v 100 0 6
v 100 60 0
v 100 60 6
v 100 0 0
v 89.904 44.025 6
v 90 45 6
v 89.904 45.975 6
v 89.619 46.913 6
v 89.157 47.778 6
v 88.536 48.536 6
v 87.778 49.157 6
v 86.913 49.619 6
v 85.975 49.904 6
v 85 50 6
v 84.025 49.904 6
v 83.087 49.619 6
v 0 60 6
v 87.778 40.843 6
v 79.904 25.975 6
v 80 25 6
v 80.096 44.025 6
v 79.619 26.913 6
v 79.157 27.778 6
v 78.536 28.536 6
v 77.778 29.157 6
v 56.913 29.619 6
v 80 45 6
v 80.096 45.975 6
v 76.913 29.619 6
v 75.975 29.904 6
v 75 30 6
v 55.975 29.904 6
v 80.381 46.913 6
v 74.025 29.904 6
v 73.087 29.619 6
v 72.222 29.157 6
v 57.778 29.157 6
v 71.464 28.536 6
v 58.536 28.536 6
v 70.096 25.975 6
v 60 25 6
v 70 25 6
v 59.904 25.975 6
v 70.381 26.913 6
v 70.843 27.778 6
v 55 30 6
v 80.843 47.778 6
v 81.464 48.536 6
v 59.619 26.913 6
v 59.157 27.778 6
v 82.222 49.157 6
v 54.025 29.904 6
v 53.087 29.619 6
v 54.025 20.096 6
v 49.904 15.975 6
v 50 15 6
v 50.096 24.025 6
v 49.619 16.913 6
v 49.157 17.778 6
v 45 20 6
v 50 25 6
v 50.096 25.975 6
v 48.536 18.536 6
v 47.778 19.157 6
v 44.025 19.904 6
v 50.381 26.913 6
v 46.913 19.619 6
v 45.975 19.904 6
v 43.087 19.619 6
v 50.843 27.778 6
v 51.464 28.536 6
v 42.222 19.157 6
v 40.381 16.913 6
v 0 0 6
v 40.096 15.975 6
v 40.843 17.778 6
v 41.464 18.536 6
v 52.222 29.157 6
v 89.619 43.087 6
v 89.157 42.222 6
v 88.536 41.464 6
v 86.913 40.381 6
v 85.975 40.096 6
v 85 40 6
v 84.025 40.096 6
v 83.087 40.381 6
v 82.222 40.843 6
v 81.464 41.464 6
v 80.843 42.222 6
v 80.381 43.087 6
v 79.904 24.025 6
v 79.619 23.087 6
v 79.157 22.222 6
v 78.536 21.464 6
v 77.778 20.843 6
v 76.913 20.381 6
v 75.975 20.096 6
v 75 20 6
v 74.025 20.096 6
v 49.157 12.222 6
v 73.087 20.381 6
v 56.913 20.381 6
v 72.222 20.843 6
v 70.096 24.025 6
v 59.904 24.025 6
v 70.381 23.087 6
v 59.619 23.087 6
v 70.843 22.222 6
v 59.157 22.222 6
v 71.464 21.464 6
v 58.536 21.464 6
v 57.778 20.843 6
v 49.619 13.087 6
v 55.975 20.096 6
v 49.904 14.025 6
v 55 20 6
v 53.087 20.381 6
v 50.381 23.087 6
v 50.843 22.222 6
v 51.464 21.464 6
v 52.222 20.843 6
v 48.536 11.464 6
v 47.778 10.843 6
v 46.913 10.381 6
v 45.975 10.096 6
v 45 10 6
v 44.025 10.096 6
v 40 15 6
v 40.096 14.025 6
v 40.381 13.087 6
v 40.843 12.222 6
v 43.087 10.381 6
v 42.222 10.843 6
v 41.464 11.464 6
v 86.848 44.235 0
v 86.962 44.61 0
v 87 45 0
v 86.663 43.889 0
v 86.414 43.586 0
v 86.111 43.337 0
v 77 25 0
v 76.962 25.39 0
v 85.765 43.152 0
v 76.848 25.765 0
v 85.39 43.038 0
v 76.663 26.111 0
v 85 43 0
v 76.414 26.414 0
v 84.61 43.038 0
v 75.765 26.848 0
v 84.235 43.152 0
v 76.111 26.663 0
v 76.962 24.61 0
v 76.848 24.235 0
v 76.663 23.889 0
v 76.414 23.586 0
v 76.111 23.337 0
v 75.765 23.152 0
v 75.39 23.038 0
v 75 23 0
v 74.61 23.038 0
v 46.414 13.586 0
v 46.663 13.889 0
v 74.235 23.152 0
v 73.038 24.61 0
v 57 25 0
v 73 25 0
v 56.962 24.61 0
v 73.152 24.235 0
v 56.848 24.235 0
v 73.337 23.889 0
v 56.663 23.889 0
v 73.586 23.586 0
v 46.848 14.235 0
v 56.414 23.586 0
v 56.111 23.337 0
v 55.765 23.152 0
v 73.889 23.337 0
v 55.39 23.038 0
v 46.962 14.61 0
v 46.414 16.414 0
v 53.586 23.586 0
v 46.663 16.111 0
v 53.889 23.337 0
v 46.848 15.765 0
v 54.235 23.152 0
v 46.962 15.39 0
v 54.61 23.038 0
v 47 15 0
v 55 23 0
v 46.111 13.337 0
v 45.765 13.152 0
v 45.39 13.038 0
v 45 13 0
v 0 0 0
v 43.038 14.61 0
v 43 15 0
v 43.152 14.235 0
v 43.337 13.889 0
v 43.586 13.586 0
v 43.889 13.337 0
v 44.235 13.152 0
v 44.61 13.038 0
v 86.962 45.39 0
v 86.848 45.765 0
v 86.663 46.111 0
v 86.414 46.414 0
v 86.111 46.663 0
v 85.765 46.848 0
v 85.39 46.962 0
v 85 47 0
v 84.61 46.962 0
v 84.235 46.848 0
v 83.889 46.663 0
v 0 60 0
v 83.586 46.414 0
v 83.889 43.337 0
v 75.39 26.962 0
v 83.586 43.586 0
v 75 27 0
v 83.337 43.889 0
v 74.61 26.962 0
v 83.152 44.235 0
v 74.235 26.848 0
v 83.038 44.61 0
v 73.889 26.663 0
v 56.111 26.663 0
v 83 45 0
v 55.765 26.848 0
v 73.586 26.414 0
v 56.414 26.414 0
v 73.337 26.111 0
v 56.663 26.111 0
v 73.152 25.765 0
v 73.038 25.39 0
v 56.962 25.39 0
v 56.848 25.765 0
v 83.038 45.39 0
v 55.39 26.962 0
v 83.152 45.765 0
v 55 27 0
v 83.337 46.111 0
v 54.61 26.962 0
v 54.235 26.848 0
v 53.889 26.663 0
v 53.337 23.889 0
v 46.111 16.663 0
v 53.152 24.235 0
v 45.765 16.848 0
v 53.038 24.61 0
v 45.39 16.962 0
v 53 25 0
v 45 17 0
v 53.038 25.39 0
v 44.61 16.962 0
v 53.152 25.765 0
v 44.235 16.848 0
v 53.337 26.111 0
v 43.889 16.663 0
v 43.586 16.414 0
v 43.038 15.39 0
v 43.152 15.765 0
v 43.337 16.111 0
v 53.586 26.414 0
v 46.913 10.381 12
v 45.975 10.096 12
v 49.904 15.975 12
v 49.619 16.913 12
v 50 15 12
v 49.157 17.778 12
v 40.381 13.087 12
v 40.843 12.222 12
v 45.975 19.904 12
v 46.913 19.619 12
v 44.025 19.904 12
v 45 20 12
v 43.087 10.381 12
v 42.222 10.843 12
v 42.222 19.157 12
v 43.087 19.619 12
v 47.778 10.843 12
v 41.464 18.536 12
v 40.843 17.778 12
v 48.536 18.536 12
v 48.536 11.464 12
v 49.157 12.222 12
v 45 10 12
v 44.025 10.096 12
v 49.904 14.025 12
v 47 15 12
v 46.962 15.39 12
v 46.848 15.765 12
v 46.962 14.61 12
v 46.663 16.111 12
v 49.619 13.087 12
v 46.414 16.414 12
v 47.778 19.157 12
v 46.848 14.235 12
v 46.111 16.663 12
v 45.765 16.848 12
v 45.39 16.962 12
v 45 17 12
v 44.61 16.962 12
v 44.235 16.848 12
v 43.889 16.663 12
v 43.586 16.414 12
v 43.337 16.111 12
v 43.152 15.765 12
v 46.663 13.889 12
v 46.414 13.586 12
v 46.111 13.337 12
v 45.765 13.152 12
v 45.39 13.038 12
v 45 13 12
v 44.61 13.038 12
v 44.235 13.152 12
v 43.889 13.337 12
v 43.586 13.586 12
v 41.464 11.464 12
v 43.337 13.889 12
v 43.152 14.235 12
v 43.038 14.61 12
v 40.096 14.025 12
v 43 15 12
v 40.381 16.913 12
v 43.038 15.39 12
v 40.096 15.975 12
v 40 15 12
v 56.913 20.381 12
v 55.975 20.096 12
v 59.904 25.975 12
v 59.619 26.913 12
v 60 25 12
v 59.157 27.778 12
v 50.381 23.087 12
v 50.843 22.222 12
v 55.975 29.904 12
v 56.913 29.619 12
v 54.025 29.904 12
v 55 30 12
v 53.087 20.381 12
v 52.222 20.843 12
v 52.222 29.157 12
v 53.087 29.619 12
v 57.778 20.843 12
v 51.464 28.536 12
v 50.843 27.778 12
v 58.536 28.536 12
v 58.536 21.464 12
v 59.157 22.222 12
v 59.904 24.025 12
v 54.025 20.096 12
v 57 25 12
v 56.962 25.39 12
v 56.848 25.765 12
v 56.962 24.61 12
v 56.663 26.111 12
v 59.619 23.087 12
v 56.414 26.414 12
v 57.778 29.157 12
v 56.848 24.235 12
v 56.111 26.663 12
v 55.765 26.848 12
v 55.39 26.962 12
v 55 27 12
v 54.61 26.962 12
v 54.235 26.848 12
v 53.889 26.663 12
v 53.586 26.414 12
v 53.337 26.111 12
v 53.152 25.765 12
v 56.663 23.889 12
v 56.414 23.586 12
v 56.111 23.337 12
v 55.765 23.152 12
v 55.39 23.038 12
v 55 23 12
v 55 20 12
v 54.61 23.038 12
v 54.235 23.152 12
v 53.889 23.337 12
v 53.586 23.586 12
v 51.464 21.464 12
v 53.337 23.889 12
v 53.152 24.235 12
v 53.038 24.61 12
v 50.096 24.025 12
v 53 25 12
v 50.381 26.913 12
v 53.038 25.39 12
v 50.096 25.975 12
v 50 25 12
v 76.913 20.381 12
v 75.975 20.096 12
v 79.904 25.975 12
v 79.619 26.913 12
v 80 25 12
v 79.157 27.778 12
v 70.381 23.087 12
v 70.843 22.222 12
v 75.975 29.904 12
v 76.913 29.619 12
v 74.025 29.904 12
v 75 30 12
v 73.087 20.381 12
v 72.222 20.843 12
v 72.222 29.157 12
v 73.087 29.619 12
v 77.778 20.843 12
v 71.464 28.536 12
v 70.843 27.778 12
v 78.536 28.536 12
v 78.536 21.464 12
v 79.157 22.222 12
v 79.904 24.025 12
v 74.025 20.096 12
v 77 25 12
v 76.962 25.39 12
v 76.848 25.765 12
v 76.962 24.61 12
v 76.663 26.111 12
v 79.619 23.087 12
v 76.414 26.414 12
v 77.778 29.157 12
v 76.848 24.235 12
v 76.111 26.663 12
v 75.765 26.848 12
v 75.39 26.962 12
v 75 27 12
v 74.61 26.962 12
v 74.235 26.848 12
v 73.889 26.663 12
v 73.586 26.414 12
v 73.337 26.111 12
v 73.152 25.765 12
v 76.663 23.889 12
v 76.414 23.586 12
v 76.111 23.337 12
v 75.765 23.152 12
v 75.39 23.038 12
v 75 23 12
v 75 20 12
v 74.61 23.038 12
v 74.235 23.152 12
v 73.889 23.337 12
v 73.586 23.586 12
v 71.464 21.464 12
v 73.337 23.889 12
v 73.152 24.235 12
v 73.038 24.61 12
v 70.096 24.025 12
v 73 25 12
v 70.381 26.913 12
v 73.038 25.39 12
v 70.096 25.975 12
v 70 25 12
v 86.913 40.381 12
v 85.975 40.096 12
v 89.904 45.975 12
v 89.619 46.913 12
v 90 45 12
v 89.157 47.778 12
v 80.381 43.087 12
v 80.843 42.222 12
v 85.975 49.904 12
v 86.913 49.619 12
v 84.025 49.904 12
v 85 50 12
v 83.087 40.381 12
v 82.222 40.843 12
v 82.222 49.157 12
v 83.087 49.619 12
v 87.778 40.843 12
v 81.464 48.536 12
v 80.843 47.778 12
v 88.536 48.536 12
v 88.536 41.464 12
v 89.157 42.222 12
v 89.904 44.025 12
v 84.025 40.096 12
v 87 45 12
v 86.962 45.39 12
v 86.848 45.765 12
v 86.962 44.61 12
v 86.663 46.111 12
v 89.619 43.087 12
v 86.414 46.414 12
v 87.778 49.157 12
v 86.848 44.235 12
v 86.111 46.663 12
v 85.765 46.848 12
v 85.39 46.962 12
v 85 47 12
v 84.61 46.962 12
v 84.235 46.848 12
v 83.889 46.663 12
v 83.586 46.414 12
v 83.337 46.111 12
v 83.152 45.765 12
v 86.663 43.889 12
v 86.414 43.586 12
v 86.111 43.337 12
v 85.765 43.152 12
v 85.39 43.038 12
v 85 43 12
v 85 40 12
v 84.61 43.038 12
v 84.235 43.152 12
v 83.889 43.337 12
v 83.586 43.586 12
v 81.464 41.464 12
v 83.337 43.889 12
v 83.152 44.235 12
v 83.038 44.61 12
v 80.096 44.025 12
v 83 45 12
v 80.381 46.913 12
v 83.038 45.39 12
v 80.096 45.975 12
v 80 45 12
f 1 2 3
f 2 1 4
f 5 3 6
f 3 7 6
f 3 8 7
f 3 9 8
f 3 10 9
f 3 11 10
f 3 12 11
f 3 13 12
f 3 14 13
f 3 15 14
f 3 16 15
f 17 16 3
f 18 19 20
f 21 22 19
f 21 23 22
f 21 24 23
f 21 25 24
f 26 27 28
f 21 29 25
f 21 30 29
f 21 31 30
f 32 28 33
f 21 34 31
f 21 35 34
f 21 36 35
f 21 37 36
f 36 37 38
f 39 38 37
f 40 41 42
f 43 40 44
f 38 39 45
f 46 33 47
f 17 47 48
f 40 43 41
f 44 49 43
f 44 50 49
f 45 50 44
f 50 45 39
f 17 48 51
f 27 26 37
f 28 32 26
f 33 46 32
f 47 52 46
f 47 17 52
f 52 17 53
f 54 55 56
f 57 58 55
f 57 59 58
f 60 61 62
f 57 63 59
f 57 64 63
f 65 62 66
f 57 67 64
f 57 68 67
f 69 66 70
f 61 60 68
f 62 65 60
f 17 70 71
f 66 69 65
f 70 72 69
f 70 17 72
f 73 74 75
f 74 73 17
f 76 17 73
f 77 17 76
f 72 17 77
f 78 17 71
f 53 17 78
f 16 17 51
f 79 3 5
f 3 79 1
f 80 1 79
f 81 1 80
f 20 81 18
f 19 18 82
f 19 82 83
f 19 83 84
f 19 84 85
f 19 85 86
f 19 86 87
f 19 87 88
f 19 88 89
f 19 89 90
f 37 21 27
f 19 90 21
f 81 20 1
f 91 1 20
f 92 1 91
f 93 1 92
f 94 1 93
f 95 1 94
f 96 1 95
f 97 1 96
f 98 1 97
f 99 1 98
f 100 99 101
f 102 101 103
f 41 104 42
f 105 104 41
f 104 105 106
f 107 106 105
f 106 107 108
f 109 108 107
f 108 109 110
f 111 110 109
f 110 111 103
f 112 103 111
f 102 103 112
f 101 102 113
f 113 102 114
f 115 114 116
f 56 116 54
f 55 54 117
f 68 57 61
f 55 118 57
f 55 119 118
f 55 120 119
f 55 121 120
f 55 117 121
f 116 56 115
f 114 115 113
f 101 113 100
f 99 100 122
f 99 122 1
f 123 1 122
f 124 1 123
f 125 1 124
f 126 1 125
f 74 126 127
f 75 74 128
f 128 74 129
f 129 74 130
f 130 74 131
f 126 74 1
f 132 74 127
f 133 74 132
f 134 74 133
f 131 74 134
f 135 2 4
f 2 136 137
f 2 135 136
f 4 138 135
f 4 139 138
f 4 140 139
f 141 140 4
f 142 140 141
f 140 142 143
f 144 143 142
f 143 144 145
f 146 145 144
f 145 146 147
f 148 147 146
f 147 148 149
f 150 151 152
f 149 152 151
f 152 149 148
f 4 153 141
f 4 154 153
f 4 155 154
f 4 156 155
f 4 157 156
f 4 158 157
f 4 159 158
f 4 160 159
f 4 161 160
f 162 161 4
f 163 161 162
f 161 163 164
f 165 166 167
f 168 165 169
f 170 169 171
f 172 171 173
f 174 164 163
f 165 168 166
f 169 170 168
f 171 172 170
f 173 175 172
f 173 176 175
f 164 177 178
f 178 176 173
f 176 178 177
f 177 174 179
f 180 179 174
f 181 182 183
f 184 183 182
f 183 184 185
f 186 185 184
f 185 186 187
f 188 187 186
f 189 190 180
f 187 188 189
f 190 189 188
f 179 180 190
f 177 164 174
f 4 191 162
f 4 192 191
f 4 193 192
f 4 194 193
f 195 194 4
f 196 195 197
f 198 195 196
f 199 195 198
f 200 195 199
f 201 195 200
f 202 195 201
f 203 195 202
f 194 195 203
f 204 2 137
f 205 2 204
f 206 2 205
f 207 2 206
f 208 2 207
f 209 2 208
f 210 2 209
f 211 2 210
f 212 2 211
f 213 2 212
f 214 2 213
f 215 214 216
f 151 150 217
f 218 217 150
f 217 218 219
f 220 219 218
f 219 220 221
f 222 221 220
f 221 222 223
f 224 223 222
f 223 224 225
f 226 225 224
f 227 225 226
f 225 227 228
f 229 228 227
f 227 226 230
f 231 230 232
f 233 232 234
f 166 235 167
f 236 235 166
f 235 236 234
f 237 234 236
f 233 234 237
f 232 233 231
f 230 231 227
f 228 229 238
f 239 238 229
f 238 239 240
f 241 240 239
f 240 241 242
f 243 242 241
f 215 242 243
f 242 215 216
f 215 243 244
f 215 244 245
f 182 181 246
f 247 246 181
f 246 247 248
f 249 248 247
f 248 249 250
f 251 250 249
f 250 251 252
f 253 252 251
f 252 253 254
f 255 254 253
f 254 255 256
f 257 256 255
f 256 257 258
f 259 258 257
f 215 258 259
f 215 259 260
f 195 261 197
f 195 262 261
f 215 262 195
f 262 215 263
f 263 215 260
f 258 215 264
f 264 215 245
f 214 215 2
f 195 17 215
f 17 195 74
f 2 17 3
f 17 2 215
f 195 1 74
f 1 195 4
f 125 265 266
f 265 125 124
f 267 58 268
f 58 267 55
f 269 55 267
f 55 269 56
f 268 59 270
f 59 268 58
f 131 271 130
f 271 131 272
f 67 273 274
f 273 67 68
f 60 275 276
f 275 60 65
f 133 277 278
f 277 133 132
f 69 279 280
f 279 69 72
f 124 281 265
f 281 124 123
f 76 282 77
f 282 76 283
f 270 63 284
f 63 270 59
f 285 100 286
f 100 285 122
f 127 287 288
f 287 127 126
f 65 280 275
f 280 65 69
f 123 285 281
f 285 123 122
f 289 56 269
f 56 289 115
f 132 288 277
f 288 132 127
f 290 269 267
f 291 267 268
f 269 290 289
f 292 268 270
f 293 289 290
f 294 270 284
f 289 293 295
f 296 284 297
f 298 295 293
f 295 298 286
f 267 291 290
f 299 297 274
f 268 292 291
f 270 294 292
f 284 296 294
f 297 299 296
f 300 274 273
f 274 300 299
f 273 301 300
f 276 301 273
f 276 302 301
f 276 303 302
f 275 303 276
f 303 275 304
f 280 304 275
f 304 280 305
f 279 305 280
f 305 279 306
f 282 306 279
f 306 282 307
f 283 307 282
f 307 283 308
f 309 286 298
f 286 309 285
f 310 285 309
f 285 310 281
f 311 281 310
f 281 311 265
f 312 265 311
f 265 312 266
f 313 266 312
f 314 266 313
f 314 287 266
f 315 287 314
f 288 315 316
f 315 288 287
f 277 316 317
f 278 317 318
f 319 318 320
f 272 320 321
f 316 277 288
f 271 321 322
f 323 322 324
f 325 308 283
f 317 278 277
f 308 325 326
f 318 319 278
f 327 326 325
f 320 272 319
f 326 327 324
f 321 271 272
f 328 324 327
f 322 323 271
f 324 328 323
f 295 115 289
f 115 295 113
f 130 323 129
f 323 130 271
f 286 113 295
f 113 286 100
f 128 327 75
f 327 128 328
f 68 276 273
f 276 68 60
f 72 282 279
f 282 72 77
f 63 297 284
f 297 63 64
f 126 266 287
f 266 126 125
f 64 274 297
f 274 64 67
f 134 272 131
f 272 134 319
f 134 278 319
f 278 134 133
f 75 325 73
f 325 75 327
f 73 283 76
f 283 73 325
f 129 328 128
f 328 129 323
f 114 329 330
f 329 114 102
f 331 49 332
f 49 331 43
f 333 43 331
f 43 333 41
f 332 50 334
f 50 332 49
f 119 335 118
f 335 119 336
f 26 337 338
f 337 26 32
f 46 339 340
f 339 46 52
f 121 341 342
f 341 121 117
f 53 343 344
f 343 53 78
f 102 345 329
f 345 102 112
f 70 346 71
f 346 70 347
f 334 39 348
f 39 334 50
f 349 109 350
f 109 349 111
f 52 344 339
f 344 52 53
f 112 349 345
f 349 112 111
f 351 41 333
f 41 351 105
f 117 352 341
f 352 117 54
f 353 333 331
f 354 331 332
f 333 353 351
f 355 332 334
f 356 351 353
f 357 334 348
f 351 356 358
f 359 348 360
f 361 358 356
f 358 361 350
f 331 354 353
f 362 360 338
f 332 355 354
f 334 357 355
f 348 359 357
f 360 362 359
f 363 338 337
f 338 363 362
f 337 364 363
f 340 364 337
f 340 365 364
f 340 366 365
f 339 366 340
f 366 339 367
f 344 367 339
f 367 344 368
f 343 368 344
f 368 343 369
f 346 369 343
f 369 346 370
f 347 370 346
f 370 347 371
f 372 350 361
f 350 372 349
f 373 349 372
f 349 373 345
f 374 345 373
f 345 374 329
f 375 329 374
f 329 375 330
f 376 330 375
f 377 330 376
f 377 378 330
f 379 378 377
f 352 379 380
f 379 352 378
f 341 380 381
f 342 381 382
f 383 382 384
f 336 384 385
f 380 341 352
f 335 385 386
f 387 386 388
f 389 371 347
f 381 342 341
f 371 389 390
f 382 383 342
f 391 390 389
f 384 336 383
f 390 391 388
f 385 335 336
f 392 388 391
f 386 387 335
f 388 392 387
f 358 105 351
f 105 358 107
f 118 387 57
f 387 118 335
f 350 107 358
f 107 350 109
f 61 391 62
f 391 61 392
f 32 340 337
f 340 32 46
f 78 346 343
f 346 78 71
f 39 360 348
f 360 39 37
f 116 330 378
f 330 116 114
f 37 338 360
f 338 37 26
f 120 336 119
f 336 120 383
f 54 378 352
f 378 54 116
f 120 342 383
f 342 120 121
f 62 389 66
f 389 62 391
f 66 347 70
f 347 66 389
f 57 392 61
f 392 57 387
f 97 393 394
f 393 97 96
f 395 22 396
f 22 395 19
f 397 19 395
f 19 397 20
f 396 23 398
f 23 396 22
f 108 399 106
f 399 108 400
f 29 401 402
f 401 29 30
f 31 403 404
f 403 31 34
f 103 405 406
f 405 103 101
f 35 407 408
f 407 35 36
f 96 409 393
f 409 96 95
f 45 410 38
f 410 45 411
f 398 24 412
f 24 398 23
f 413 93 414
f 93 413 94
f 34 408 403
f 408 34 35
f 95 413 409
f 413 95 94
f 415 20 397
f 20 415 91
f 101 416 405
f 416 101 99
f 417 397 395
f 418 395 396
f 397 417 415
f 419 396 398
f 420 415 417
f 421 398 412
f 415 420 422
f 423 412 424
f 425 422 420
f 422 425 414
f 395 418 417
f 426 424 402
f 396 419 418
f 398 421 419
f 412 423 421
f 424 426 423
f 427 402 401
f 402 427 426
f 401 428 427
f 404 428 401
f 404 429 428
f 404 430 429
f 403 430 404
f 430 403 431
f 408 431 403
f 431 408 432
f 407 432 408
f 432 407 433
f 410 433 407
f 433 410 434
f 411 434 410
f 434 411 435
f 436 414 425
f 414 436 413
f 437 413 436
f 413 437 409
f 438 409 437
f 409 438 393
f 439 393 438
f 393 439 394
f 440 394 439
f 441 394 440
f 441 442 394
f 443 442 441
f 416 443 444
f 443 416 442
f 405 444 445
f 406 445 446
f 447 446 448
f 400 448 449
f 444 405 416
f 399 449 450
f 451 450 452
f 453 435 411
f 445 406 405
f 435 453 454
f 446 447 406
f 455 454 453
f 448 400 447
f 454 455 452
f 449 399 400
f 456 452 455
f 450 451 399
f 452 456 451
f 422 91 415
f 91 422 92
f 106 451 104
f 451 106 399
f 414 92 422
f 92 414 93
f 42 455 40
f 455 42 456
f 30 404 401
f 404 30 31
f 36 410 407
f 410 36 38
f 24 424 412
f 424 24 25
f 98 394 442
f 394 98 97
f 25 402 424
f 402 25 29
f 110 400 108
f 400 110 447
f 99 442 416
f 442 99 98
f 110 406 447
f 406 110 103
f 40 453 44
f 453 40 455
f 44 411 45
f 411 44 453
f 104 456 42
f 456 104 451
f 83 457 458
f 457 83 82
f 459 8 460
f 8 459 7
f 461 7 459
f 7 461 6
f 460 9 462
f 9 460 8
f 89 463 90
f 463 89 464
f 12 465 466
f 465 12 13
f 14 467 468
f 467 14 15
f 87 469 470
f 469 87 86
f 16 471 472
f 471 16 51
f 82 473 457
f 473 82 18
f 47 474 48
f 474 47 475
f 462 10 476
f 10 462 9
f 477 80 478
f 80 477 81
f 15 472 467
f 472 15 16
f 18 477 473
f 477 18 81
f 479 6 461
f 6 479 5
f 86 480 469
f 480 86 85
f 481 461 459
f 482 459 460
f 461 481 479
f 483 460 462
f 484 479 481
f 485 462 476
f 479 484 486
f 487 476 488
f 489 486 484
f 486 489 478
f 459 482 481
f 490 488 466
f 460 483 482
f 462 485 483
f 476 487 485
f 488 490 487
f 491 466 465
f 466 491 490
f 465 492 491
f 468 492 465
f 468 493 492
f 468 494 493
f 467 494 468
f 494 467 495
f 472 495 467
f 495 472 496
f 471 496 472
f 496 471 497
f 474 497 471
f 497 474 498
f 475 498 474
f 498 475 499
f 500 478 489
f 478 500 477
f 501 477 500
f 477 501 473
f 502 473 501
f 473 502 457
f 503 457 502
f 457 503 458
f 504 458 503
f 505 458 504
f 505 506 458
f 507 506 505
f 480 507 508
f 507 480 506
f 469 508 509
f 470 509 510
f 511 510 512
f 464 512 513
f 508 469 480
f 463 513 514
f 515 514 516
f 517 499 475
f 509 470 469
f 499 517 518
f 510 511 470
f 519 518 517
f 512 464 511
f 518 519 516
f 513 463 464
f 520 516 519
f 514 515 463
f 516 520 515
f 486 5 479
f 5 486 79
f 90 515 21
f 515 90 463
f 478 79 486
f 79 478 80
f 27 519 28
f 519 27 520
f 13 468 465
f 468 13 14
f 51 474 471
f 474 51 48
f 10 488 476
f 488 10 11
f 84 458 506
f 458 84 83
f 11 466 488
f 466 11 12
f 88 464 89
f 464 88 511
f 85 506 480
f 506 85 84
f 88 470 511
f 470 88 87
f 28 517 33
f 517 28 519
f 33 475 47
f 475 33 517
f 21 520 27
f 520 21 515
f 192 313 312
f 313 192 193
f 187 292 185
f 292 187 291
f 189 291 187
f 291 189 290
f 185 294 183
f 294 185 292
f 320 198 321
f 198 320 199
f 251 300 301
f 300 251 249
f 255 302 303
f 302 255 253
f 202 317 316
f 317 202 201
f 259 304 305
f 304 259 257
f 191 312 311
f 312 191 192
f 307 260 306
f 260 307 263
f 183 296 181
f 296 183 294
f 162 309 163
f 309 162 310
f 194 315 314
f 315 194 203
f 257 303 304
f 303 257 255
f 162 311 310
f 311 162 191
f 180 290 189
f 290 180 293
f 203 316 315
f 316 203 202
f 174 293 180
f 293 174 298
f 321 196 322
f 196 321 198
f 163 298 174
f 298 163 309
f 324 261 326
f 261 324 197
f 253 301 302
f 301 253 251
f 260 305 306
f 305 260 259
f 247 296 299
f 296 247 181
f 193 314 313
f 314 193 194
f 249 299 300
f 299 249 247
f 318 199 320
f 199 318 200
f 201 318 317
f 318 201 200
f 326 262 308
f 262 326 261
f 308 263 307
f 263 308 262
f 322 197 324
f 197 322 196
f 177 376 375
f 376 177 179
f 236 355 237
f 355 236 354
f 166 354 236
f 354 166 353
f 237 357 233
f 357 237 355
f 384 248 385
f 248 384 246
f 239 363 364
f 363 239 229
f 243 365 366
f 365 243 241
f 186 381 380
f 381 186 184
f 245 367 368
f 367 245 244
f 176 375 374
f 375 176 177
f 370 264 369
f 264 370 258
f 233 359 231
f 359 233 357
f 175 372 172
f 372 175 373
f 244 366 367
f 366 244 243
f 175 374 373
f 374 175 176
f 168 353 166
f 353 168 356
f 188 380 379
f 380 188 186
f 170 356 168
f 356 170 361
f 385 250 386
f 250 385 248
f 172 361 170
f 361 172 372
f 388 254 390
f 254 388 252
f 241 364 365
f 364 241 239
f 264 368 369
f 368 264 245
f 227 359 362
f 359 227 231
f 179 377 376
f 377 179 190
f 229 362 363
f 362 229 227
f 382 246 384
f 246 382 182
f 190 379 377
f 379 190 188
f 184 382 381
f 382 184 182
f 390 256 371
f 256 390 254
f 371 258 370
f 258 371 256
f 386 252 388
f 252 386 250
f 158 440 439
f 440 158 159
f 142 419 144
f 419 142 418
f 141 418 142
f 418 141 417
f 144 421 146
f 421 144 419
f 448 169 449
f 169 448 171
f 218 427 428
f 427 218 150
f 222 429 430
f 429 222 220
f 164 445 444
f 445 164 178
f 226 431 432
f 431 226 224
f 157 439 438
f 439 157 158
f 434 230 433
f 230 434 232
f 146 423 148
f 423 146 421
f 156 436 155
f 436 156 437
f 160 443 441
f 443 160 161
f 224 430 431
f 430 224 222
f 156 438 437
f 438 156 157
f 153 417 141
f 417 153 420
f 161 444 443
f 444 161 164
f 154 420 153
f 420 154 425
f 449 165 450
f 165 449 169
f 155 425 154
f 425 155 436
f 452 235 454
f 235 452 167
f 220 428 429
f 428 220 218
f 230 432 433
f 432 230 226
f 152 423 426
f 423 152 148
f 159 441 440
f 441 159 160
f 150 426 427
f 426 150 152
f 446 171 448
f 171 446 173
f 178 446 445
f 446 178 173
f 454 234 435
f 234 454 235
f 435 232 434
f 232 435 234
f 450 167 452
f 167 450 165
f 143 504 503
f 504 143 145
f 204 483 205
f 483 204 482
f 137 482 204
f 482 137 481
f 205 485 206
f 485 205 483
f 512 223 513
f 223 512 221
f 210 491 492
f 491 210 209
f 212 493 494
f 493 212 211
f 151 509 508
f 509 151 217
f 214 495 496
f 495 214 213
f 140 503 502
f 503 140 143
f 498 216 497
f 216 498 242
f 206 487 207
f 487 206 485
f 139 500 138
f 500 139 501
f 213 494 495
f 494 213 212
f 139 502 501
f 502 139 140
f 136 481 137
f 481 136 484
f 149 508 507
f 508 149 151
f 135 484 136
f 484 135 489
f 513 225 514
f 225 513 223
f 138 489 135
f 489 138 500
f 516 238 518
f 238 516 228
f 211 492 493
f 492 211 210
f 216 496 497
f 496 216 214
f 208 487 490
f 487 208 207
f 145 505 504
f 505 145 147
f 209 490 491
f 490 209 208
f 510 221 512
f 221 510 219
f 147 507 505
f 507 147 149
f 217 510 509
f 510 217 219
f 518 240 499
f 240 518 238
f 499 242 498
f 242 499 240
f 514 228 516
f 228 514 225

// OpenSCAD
$fn = 32;

// ----------------------------------------------------------------------
// Boss field: plate with bosses at given coordinates
// ----------------------------------------------------------------------

// --- parameters (mm) ---
plate_l = 100;            // plate length, X
plate_w = 60;             // plate width, Y
plate_t = 6;              // plate thickness, Z
boss_d = 10;              // boss diameter
boss_h = 6;               // boss height above the plate
bore_d = 4;               // boss bore

total_h = plate_t + boss_h;  // overall height

difference() {
  union() {
    cube([plate_l, plate_w, plate_t]);
    translate([45, 15, plate_t]) cylinder(h = boss_h, d = boss_d);
    translate([55, 25, plate_t]) cylinder(h = boss_h, d = boss_d);
    translate([75, 25, plate_t]) cylinder(h = boss_h, d = boss_d);
    translate([85, 45, plate_t]) cylinder(h = boss_h, d = boss_d);
  }
  translate([45, 15, -1]) cylinder(h = total_h + 2, d = bore_d);
  translate([55, 25, -1]) cylinder(h = total_h + 2, d = bore_d);
  translate([75, 25, -1]) cylinder(h = total_h + 2, d = bore_d);
  translate([85, 45, -1]) cylinder(h = total_h + 2, d = bore_d);
}
